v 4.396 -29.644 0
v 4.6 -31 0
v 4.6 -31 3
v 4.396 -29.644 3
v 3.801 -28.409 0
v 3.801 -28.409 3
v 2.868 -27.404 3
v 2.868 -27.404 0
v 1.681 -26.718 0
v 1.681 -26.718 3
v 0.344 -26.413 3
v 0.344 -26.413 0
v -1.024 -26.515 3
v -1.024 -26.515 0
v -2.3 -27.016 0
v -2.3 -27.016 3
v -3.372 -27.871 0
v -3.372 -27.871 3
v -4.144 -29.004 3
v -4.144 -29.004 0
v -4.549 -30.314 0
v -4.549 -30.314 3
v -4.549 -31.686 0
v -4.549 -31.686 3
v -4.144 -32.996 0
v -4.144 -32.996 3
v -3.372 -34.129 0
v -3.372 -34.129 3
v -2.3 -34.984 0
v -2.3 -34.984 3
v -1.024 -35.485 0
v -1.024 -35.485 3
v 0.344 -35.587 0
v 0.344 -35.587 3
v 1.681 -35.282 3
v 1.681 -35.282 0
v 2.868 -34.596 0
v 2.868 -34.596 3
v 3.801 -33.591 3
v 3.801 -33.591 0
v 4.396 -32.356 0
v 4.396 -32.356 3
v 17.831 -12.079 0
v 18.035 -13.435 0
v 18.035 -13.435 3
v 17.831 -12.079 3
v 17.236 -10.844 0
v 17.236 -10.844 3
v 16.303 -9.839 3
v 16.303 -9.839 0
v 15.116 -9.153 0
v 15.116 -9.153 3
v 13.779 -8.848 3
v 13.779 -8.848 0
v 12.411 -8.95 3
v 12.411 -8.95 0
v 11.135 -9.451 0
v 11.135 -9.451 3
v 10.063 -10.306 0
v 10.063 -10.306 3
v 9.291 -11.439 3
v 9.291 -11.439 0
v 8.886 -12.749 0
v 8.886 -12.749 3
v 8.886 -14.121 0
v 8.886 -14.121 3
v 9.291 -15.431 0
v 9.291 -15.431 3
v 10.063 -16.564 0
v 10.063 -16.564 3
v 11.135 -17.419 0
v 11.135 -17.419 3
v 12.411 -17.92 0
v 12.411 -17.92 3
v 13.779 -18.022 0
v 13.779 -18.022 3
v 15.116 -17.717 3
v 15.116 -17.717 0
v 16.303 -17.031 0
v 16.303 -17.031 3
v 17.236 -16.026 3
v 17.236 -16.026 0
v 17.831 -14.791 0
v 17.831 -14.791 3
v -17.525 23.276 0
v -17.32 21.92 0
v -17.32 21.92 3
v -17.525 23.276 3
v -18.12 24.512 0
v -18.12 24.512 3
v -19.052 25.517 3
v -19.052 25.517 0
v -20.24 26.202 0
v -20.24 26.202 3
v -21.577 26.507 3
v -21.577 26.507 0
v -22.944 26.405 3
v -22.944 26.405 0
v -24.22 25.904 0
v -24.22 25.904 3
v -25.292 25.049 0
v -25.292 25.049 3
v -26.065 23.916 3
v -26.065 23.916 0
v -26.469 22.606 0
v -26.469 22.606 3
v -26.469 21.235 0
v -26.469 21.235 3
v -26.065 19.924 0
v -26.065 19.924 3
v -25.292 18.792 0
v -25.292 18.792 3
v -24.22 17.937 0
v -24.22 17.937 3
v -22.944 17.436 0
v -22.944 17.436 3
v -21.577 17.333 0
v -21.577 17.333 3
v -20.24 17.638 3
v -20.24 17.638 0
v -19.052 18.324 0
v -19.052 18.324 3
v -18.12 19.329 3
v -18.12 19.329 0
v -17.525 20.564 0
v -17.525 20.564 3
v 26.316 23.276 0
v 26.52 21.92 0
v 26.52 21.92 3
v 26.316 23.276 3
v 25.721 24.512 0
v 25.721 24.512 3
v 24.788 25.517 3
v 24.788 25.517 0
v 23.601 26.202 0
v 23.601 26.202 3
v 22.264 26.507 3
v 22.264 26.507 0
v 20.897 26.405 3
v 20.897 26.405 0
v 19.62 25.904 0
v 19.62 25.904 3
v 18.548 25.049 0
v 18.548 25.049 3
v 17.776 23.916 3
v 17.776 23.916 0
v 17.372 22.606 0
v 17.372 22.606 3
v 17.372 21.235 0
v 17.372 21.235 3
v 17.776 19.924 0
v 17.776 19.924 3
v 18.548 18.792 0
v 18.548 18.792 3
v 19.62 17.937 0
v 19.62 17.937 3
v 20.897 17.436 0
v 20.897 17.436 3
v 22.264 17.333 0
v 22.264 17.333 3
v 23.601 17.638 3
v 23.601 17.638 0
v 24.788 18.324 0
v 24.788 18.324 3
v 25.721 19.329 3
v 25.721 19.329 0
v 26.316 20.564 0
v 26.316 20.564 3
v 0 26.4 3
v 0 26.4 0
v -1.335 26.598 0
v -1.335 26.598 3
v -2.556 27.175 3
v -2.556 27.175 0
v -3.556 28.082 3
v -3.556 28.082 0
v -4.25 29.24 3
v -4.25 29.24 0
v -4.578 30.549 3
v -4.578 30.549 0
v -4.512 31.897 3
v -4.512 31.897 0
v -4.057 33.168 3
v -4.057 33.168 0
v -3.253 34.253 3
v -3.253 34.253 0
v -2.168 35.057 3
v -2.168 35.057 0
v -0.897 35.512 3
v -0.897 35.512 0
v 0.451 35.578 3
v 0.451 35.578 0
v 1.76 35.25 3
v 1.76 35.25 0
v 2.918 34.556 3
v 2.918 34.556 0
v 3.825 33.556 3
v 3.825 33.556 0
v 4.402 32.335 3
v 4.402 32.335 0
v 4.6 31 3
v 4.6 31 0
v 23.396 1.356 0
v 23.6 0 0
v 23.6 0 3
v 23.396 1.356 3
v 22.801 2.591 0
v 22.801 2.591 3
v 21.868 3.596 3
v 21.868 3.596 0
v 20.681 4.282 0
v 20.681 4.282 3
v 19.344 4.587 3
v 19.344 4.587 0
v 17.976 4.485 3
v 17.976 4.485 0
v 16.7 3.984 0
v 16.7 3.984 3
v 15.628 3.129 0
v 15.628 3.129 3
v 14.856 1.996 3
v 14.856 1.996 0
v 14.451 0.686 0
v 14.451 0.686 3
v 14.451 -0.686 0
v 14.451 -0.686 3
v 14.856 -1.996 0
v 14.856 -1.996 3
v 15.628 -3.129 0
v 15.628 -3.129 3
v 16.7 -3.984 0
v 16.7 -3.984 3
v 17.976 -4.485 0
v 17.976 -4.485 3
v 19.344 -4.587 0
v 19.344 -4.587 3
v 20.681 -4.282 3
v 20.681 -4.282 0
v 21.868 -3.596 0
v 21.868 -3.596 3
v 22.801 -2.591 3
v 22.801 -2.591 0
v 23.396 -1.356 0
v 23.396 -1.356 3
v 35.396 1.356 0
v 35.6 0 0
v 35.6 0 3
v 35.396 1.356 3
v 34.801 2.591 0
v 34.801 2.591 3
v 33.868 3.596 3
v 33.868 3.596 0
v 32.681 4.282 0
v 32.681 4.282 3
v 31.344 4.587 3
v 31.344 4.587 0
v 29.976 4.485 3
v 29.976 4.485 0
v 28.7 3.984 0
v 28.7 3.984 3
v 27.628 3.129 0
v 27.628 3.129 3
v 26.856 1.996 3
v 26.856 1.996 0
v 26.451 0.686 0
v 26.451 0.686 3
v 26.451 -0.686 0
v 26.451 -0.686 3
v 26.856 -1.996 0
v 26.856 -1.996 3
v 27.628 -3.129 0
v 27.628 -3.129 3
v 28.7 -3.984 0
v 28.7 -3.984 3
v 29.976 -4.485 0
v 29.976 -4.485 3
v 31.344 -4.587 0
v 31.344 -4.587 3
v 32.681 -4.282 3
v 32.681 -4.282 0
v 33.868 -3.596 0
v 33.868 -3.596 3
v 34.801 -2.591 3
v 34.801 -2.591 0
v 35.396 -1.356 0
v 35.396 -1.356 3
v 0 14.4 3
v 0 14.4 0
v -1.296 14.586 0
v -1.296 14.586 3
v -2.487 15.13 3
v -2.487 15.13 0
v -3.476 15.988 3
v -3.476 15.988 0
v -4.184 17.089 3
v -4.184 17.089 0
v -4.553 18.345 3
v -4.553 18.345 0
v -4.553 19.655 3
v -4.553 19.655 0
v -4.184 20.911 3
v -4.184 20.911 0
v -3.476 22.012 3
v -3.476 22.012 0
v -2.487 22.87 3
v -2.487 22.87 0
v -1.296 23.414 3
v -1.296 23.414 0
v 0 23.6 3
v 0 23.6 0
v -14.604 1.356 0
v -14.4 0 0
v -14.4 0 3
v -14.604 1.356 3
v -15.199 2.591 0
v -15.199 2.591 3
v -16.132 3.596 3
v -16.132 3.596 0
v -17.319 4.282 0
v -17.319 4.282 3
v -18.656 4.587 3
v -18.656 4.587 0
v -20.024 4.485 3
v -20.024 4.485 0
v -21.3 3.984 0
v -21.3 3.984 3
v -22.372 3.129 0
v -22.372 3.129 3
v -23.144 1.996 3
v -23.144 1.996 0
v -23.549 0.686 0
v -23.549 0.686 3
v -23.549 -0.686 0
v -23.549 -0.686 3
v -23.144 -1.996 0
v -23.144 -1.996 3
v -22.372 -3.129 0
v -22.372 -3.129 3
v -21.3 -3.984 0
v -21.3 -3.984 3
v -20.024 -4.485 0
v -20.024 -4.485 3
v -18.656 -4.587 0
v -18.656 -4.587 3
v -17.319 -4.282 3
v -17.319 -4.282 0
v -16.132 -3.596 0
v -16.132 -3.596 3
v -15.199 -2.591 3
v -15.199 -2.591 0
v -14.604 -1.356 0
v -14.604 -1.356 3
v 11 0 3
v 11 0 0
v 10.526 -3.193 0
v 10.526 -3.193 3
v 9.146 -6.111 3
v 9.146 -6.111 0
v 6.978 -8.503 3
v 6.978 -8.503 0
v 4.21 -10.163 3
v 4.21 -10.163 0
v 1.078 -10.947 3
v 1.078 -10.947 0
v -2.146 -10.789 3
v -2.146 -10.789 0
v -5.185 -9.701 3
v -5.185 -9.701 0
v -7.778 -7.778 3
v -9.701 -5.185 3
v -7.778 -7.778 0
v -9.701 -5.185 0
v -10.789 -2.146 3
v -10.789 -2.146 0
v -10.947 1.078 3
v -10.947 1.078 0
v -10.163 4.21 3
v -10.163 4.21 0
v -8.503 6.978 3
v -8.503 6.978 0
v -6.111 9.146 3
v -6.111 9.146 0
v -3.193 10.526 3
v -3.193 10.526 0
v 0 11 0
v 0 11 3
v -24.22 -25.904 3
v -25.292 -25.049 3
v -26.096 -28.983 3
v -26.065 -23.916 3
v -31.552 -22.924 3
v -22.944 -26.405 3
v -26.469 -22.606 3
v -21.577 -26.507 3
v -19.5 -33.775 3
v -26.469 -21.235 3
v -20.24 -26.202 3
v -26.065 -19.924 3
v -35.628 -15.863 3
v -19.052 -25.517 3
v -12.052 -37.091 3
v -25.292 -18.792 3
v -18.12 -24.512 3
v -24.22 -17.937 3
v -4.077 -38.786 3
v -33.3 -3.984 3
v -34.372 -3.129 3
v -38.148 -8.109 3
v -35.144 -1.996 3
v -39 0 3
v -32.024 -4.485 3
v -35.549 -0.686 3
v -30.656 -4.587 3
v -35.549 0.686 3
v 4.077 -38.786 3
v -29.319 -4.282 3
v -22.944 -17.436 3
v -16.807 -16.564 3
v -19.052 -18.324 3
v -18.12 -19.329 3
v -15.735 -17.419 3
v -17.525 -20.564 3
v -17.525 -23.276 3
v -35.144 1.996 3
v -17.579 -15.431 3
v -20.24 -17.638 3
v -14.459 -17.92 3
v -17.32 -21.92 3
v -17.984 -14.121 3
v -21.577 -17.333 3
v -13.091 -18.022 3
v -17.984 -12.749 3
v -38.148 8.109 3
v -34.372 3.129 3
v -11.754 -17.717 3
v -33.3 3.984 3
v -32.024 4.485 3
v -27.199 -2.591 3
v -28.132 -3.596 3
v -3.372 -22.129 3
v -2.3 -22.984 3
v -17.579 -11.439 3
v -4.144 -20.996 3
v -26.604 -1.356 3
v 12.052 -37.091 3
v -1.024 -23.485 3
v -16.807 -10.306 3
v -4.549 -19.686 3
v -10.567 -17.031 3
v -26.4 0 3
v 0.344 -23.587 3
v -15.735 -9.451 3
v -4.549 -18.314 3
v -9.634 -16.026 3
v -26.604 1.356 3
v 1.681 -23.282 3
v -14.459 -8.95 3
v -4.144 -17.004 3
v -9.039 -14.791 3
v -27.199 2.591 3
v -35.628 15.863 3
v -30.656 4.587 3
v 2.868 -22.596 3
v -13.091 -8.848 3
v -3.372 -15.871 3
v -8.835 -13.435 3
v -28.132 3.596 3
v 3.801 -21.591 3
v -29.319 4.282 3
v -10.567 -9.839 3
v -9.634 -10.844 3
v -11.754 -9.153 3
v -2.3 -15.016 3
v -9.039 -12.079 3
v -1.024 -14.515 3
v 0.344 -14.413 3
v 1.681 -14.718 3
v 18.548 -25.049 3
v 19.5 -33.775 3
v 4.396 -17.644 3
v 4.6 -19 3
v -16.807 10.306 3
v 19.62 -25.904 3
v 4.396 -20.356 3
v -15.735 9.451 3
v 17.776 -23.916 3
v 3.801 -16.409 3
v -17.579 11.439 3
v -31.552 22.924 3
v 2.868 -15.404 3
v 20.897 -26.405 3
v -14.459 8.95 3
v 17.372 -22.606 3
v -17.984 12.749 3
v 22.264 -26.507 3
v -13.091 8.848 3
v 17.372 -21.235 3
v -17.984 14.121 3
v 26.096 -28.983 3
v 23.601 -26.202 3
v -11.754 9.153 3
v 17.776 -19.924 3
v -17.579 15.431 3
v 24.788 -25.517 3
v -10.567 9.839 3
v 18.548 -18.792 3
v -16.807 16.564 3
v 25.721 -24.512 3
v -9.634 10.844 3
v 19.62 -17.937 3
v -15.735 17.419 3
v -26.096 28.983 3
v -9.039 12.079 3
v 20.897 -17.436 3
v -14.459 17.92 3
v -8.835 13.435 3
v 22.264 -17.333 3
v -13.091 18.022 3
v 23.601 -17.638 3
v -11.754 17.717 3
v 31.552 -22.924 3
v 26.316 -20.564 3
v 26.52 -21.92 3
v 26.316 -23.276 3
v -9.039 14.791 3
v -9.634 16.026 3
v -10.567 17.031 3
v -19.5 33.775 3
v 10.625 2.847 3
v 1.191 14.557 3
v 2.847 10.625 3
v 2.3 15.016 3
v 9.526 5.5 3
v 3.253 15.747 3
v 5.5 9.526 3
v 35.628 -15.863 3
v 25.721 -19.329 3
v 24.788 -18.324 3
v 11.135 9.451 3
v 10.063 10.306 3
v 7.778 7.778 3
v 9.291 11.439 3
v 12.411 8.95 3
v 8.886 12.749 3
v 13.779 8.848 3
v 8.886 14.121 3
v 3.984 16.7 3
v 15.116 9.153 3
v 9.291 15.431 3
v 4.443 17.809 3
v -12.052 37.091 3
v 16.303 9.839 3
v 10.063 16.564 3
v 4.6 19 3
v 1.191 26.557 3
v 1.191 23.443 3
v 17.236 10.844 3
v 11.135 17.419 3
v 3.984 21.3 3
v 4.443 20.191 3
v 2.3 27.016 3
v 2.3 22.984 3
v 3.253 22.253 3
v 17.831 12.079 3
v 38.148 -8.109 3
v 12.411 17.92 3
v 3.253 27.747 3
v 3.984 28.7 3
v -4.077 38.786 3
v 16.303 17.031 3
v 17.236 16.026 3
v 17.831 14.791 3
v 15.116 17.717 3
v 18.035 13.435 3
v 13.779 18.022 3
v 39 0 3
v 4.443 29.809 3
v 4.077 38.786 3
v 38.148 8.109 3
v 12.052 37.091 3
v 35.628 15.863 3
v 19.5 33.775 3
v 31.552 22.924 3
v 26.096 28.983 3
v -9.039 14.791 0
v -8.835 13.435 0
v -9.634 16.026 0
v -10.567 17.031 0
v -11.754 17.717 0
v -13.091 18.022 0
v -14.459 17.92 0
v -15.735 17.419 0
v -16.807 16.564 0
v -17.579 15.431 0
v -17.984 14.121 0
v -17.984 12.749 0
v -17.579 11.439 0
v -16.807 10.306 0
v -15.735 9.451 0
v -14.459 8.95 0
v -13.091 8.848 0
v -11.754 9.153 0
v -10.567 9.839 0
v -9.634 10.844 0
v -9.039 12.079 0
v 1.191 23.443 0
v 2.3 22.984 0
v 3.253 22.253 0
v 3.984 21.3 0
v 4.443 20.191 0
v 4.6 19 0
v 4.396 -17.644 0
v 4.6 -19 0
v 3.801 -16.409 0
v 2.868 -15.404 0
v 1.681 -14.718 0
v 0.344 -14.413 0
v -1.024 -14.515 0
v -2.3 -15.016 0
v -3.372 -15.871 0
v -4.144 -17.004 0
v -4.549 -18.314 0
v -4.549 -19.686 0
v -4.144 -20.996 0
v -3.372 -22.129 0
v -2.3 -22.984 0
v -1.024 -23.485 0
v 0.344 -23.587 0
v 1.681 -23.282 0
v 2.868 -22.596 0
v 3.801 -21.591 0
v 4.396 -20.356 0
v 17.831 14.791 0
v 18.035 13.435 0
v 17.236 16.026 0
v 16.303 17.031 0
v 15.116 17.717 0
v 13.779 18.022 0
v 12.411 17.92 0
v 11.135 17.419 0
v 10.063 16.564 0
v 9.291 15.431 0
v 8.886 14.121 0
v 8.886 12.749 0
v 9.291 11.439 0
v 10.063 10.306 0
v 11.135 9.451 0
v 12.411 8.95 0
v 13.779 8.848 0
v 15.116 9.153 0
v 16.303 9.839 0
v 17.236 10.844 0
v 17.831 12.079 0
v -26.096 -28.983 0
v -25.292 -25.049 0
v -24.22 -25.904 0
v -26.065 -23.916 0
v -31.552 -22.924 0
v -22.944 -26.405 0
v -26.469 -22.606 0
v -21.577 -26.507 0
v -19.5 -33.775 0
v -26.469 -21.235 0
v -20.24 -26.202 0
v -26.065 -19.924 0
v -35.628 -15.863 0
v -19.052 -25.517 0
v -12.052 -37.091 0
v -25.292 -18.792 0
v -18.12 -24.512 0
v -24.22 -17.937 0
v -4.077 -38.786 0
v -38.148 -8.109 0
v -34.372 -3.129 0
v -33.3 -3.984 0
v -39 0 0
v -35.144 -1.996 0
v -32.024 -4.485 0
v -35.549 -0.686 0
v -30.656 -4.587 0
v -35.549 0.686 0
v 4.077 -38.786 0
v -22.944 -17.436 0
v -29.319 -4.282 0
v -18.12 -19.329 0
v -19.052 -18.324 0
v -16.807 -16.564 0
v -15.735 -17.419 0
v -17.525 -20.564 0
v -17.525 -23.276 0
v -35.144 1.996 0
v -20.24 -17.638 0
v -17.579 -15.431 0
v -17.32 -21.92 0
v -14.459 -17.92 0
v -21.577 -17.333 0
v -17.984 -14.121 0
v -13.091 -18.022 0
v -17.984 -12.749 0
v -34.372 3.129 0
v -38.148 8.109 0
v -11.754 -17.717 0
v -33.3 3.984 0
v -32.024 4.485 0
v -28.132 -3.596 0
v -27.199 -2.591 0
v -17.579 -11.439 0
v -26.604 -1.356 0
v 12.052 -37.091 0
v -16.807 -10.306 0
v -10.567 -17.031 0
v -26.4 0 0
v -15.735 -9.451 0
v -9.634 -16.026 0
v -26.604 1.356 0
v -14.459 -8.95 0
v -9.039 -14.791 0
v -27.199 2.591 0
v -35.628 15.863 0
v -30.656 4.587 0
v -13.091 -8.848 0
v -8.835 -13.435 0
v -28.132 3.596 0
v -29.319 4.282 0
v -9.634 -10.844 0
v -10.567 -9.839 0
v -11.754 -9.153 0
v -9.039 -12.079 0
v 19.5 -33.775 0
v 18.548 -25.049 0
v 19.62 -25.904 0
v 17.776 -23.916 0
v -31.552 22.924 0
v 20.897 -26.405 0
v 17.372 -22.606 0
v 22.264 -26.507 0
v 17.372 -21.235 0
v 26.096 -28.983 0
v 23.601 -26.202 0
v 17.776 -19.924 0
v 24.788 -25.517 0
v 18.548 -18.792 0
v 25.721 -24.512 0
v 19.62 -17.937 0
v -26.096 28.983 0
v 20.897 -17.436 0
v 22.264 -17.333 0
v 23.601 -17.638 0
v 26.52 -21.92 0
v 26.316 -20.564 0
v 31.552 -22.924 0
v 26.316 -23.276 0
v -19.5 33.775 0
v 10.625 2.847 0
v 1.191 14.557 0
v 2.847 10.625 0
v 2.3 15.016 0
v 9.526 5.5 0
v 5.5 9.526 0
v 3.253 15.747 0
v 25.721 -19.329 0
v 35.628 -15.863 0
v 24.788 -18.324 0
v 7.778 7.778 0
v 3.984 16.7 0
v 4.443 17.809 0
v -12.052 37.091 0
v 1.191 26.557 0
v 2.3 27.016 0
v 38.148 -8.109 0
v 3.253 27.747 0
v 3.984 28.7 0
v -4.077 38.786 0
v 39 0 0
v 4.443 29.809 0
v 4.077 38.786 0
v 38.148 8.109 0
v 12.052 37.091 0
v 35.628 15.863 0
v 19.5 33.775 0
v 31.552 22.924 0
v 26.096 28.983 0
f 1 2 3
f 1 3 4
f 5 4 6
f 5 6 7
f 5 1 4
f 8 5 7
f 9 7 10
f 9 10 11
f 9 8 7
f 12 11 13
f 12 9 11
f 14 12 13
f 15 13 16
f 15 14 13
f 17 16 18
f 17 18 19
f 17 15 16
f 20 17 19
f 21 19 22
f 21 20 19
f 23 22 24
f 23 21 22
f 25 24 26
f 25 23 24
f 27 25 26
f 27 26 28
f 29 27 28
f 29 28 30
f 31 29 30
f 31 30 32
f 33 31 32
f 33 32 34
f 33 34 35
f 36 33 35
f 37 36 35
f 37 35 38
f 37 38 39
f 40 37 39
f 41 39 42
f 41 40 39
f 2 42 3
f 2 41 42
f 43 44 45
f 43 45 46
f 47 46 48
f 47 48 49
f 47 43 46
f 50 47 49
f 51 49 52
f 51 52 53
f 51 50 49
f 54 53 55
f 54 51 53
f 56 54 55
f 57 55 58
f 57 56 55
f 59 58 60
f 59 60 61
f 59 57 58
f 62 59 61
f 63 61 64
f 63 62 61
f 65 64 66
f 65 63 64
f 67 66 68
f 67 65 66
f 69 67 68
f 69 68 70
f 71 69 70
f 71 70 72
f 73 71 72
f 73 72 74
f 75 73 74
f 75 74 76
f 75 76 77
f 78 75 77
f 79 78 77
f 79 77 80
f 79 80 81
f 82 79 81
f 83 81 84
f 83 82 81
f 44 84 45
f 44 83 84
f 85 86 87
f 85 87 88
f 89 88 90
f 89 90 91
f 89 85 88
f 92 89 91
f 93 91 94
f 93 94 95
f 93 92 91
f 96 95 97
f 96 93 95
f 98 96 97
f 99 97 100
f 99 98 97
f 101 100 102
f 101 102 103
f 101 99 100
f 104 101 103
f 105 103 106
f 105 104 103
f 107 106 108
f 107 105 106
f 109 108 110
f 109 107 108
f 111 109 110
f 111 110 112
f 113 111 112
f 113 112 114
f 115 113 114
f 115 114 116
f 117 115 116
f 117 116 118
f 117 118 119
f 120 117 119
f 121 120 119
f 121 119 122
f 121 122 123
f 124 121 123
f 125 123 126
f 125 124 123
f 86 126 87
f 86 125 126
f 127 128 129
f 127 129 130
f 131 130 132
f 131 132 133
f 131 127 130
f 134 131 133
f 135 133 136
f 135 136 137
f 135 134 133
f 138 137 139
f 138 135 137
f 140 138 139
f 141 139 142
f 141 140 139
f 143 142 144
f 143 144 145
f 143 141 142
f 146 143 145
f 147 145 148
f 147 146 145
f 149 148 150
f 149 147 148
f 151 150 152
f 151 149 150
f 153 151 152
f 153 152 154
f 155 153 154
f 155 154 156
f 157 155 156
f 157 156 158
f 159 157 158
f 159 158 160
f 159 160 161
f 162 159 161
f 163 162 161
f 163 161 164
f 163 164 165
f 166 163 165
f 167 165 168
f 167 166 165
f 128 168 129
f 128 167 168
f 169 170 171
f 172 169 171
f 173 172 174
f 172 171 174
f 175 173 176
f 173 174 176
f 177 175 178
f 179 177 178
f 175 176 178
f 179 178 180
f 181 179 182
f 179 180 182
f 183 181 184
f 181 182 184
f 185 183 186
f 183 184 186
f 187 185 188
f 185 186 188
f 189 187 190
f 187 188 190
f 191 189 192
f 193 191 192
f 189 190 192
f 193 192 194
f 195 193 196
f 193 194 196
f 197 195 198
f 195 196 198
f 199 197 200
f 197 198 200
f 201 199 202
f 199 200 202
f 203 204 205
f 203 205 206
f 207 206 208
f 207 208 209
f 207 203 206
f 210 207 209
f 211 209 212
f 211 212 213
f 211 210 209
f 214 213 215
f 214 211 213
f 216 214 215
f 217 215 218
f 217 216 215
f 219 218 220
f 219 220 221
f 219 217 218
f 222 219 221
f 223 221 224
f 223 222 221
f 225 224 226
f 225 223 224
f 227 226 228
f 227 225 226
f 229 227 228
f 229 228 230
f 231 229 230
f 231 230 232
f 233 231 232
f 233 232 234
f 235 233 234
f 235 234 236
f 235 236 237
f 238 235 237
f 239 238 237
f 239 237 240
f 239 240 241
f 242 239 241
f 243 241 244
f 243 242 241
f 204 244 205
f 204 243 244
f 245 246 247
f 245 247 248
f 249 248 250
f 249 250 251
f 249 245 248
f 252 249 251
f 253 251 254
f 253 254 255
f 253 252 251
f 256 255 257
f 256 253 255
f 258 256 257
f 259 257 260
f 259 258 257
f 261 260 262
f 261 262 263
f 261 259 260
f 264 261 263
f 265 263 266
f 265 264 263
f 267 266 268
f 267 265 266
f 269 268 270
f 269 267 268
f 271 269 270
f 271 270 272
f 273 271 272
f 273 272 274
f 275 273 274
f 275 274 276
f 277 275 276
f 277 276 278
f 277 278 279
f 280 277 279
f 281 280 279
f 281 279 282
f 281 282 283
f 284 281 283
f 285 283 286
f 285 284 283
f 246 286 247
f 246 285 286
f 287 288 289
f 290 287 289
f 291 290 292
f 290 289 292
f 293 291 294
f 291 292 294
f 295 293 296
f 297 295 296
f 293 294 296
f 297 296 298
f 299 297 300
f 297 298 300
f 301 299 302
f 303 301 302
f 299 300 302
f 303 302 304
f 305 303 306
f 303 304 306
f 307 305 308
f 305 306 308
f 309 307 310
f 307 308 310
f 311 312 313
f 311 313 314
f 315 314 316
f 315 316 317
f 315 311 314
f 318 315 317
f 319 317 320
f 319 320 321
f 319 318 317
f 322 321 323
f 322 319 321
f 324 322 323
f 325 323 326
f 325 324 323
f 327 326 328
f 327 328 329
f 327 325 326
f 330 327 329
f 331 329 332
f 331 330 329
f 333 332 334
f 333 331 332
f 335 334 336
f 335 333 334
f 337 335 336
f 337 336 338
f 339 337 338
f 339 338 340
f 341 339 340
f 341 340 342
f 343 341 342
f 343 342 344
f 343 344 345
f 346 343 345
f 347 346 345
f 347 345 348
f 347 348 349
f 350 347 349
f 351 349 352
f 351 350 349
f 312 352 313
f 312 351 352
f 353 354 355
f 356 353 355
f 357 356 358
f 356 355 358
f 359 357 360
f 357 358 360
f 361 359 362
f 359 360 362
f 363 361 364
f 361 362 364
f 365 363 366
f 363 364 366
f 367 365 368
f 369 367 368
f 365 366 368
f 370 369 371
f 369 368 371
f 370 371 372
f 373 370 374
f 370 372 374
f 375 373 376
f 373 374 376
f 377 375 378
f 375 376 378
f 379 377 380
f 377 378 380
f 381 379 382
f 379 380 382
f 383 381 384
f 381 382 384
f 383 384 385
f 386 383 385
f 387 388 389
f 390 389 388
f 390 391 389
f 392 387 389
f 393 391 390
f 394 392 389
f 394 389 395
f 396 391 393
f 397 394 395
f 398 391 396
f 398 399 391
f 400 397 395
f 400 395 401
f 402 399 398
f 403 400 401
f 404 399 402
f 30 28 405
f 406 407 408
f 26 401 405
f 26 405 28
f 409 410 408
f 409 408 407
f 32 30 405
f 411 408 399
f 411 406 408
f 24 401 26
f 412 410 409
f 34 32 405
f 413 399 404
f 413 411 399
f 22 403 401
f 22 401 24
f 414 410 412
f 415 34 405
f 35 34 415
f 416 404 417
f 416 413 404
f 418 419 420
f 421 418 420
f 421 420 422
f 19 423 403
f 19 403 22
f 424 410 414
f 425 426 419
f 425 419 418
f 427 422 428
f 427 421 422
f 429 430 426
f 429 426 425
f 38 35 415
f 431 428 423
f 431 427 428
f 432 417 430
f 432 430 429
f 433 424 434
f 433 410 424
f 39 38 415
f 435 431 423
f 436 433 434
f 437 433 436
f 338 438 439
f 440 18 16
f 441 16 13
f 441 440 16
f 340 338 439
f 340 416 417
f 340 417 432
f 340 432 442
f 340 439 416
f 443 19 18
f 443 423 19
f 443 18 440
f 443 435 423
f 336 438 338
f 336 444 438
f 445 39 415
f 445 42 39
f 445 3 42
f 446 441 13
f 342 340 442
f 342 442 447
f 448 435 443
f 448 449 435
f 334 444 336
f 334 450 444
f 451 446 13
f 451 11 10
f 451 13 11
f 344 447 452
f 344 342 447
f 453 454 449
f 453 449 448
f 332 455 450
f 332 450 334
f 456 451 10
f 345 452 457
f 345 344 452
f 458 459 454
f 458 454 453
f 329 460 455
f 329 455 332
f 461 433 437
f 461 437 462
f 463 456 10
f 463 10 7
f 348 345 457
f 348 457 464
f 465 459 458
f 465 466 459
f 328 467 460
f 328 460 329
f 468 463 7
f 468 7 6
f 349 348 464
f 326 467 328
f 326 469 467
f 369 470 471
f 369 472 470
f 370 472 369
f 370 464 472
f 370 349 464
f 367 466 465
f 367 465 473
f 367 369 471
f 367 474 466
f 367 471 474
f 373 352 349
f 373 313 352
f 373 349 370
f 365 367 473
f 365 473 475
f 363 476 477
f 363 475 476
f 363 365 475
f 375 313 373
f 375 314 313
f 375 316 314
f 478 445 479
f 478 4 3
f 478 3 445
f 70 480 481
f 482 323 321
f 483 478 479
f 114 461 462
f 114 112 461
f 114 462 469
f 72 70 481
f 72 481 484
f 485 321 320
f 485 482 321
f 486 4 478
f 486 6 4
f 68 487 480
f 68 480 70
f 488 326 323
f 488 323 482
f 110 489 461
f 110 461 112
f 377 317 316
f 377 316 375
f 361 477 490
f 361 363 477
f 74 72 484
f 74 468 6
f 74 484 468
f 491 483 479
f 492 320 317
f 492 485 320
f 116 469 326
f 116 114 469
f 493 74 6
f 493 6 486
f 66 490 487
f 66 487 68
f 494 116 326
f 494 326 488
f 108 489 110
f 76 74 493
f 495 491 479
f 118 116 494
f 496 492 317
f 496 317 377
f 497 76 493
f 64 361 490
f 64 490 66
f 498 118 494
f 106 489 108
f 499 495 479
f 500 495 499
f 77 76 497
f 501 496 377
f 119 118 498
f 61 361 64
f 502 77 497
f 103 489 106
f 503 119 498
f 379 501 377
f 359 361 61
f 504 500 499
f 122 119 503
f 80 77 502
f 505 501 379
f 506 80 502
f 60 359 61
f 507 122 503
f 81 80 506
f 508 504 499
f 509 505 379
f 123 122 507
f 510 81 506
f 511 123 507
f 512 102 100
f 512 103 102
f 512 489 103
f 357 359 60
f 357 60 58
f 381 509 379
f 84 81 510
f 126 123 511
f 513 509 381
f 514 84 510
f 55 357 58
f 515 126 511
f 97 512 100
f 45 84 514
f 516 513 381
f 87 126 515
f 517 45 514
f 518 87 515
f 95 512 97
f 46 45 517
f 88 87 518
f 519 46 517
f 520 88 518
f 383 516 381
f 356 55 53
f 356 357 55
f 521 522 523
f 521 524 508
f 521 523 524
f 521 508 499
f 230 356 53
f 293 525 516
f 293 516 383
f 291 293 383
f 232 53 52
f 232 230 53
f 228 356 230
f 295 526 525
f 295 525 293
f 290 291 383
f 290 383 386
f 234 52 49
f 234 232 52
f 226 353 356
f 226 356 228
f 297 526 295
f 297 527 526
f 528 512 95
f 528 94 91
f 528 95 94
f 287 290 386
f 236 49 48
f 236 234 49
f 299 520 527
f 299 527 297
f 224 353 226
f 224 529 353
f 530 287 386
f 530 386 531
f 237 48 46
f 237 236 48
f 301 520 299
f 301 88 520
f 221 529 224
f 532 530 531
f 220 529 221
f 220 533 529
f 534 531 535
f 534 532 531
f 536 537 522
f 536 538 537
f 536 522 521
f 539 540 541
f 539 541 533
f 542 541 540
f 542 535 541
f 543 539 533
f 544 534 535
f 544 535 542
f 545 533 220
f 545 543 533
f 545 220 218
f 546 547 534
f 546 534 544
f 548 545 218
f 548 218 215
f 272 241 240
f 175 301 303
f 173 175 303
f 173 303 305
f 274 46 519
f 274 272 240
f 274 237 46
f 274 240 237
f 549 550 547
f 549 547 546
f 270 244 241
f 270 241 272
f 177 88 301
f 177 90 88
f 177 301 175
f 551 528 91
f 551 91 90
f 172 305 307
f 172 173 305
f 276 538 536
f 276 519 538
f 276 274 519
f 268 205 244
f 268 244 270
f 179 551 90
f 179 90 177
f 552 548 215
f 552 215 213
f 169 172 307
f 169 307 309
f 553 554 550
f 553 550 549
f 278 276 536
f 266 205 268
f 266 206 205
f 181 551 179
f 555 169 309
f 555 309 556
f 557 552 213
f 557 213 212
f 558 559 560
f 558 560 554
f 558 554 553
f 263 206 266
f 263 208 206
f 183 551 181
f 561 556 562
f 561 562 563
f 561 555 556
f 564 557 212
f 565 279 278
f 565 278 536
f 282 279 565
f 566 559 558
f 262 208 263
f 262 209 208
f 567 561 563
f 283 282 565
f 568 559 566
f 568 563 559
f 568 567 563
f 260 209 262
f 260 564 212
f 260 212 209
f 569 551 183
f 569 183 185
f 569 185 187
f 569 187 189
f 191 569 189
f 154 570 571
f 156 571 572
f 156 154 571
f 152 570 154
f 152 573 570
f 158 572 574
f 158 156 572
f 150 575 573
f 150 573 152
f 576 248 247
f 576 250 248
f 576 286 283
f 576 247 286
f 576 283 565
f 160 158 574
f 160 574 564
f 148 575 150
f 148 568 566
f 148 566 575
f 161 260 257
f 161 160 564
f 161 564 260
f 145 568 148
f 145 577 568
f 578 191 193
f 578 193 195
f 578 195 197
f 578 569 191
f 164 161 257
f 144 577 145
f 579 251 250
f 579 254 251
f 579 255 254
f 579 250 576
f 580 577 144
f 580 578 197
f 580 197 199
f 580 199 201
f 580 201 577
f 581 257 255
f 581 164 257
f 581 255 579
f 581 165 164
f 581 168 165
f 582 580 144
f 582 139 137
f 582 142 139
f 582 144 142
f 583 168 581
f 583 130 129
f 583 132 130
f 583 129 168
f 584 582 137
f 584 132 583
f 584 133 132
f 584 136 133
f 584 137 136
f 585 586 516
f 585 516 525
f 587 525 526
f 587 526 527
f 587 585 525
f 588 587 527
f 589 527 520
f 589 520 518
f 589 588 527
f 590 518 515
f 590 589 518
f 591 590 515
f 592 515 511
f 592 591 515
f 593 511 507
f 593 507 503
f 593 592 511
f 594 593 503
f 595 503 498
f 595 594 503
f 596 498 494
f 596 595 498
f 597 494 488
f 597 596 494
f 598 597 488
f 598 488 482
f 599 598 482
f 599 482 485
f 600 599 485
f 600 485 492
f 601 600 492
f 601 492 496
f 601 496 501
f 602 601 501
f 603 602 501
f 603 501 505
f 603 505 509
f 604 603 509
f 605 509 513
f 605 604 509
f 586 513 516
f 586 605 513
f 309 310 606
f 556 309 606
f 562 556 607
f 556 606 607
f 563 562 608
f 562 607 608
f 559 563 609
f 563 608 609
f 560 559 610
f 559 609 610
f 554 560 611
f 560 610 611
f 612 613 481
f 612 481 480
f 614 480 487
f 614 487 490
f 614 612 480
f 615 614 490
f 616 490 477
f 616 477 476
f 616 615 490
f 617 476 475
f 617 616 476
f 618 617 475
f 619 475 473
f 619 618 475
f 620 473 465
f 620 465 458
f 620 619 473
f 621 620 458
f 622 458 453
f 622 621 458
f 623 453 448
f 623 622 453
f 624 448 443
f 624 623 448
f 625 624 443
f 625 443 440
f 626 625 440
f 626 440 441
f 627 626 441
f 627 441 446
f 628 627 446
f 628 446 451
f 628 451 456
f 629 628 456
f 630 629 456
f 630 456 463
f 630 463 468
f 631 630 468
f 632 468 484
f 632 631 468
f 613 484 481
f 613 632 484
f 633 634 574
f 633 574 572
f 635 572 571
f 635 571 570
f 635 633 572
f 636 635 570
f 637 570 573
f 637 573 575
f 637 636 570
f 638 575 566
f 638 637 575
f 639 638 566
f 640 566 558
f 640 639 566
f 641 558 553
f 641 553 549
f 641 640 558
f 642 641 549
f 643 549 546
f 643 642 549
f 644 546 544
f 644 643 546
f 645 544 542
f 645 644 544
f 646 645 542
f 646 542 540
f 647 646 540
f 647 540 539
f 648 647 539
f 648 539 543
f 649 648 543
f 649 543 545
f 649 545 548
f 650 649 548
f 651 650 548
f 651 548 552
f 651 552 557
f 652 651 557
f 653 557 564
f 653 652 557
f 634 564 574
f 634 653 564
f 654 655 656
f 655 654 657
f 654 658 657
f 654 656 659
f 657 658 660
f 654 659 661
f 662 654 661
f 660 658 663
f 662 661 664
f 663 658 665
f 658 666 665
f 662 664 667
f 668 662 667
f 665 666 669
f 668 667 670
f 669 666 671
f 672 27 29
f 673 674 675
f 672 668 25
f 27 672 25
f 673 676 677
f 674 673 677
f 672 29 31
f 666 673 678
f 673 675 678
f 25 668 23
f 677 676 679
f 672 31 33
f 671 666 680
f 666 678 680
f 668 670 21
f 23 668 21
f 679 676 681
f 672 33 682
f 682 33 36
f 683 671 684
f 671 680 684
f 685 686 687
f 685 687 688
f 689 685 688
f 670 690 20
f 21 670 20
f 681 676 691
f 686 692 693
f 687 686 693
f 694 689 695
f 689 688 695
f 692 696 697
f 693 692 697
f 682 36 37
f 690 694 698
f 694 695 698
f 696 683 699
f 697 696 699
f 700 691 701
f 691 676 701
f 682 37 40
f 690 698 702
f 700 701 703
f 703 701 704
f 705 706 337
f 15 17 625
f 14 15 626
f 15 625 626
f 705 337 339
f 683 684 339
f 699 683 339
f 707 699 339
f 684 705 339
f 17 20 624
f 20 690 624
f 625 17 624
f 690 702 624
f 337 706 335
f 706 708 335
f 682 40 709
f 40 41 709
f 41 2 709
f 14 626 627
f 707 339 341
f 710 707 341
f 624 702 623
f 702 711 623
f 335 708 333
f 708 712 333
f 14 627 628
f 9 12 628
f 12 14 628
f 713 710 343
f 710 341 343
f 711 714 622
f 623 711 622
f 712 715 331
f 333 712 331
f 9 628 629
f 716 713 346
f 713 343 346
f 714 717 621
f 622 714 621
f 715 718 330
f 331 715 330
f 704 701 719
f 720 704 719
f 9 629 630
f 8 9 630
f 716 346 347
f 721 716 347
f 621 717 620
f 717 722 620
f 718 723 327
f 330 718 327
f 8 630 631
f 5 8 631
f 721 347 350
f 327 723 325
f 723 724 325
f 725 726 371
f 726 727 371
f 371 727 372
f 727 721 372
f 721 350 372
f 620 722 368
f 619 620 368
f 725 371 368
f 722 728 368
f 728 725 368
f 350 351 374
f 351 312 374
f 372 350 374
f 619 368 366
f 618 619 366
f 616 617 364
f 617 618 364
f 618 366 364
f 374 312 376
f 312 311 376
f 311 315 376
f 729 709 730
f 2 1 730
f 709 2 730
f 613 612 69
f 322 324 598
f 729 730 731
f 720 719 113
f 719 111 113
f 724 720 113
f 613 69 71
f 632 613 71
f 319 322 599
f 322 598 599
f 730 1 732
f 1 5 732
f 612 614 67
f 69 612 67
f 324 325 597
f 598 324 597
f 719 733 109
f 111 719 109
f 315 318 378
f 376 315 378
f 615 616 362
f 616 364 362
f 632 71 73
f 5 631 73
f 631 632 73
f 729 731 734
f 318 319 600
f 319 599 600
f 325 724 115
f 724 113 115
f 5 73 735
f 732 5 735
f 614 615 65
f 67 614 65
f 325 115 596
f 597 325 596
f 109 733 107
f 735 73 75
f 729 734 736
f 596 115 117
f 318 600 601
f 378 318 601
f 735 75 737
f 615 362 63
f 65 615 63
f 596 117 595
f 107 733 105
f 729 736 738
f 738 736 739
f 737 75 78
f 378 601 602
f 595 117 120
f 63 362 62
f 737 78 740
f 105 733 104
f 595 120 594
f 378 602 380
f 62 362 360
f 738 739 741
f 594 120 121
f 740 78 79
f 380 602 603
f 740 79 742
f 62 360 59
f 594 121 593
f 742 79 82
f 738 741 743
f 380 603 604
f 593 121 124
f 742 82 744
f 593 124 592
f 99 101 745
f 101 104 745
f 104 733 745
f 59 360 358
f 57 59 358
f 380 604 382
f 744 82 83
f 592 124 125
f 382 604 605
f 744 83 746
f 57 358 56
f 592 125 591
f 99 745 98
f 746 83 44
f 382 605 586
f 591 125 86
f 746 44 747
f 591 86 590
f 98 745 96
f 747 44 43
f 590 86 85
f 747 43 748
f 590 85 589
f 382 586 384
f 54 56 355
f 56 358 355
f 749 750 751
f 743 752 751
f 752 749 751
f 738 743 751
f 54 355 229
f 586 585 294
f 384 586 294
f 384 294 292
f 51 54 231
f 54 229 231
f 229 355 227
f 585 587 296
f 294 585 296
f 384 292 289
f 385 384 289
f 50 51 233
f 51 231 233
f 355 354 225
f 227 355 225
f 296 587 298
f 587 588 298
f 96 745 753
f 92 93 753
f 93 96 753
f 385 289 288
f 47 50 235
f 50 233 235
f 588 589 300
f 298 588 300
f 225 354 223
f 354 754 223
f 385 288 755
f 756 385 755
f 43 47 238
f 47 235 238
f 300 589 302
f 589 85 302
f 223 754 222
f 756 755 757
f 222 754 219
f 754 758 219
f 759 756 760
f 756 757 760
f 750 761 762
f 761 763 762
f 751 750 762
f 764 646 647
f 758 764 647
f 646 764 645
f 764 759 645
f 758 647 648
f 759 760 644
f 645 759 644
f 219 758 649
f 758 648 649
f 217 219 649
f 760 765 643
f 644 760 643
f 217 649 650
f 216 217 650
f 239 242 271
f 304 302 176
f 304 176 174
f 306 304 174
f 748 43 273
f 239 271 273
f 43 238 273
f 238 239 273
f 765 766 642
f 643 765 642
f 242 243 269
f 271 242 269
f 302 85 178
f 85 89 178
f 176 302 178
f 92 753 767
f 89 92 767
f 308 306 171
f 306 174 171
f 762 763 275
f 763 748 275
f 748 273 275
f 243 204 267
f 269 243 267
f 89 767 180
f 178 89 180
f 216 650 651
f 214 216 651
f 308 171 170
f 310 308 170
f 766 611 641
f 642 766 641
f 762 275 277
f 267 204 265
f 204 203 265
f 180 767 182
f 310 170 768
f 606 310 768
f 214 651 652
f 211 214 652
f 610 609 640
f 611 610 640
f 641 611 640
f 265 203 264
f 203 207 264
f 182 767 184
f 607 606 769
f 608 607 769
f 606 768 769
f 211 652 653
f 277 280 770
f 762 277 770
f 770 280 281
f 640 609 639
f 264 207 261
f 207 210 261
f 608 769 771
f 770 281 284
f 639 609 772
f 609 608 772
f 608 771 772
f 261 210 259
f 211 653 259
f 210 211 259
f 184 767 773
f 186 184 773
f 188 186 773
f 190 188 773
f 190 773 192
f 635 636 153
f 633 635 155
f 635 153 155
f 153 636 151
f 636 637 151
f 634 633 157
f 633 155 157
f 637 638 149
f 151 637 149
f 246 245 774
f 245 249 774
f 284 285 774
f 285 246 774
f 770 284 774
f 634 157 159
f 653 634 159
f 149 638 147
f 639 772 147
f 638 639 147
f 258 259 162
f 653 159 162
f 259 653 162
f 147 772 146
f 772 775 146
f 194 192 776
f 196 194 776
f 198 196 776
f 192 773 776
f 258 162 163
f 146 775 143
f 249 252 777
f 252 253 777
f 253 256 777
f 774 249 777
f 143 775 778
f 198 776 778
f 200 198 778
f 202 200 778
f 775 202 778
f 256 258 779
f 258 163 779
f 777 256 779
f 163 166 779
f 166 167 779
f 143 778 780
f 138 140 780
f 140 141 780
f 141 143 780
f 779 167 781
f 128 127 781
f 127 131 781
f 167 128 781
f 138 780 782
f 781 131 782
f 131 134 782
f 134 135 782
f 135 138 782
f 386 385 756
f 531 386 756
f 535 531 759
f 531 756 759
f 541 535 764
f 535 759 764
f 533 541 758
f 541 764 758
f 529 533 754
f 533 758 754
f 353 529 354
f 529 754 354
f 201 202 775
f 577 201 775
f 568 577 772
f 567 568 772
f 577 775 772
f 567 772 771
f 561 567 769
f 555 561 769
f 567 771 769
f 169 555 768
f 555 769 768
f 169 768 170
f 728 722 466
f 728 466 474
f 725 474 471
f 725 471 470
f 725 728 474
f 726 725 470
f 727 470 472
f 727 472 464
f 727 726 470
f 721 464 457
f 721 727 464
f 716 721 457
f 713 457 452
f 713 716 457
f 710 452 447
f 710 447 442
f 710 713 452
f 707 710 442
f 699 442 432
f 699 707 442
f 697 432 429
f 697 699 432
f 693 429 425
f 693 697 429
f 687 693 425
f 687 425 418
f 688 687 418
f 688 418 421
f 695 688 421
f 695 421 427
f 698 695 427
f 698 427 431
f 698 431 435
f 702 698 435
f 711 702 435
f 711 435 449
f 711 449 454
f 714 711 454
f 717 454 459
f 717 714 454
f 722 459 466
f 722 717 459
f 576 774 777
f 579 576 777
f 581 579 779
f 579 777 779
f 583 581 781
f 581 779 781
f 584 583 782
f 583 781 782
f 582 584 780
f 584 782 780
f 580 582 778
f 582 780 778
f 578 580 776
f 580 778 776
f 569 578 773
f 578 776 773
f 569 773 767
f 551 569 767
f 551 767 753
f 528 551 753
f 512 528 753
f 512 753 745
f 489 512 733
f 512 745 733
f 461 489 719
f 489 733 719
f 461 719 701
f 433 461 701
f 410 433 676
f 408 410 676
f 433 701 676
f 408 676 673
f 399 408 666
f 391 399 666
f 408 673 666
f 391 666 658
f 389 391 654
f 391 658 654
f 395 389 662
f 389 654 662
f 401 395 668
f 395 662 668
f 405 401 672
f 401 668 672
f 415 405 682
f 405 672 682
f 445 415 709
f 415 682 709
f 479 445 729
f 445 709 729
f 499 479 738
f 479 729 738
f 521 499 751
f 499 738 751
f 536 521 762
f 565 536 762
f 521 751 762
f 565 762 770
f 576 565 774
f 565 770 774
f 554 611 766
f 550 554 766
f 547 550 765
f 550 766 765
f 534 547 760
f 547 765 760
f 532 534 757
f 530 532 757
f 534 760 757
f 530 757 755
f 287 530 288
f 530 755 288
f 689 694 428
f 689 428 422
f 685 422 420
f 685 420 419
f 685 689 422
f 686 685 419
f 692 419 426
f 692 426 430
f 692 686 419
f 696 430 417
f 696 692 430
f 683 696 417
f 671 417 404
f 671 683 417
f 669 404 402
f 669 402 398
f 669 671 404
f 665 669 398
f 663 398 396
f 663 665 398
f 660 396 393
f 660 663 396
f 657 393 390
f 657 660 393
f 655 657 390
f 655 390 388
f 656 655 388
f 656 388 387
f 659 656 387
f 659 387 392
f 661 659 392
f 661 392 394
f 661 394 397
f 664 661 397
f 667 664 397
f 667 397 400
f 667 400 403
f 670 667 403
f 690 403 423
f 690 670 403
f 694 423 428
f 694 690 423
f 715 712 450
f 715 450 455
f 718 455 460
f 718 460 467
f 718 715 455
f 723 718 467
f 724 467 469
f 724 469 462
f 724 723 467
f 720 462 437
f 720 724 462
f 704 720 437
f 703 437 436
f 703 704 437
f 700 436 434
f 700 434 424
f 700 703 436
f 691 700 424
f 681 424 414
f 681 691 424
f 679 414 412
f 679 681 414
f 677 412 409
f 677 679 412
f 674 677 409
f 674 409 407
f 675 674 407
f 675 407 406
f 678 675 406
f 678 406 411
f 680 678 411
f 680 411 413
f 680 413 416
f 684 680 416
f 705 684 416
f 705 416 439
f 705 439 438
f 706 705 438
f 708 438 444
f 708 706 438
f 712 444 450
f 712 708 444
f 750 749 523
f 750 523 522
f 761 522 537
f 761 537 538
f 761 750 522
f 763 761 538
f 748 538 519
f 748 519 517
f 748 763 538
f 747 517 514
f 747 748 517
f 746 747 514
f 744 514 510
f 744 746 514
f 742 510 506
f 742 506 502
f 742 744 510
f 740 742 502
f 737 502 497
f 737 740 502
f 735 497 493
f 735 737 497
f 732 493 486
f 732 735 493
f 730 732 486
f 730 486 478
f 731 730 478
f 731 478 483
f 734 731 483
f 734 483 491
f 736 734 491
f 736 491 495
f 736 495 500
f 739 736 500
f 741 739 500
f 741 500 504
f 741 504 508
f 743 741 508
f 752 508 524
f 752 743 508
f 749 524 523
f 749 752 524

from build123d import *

# Parameters (mm, degrees)
F0_R     = 39
F0_R_2   = 4.6
F1_DEPTH = 3


with BuildPart() as f1:
    # F0 (on Top) → F1 (new body)
    with BuildSketch(Plane.XY):
        with BuildLine():
            ThreePointArc((0, 11), (-7.778175, -7.778175), (11, 0))
            ThreePointArc((11, 0), (7.778175, 7.778175), (0, 11))
        make_face()
        with BuildLine():
            ThreePointArc((4.6, 31), (-3.252691, 34.252691), (0, 26.4))
            ThreePointArc((0, 26.4), (3.252691, 27.747309), (4.6, 31))
        make_face()
        Circle(F0_R)
        with Locations((-21.92031, -21.92031)):
            Circle(F0_R_2, mode=Mode.SUBTRACT)
        with Locations((-13.435029, -13.435029)):
            Circle(F0_R_2, mode=Mode.SUBTRACT)
        with Locations((0, -31)):
            Circle(F0_R_2, mode=Mode.SUBTRACT)
        with Locations((21.92031, -21.92031)):
            Circle(F0_R_2, mode=Mode.SUBTRACT)
        with Locations((0, -19)):
            Circle(F0_R_2, mode=Mode.SUBTRACT)
        with Locations((13.435029, -13.435029)):
            Circle(F0_R_2, mode=Mode.SUBTRACT)
        with Locations((-31, 0)):
            Circle(F0_R_2, mode=Mode.SUBTRACT)
        with Locations((-19, 0)):
            Circle(F0_R_2, mode=Mode.SUBTRACT)
        with Locations((-13.435029, 13.435029)):
            Circle(F0_R_2, mode=Mode.SUBTRACT)
        with Locations((-21.92031, 21.92031)):
            Circle(F0_R_2, mode=Mode.SUBTRACT)
        with BuildLine():
            ThreePointArc((0, 11), (7.778175, 7.778175), (11, 0))
            ThreePointArc((11, 0), (-7.778175, -7.778175), (0, 11))
        make_face(mode=Mode.SUBTRACT)
        with Locations((19, 0)):
            Circle(F0_R_2, mode=Mode.SUBTRACT)
        with BuildLine():
            ThreePointArc((4.6, 19), (3.252691, 15.747309), (0, 14.4))
            ThreePointArc((0, 14.4), (-4.6, 19), (0, 23.6))
            ThreePointArc((0, 23.6), (3.252691, 22.252691), (4.6, 19))
        make_face(mode=Mode.SUBTRACT)
        with Locations((13.435029, 13.435029)):
            Circle(F0_R_2, mode=Mode.SUBTRACT)
        with Locations((31, 0)):
            Circle(F0_R_2, mode=Mode.SUBTRACT)
        with BuildLine():
            ThreePointArc((4.6, 31), (3.252691, 27.747309), (0, 26.4))
            ThreePointArc((0, 26.4), (-3.252691, 34.252691), (4.6, 31))
        make_face(mode=Mode.SUBTRACT)
        with Locations((21.92031, 21.92031)):
            Circle(F0_R_2, mode=Mode.SUBTRACT)
    extrude(amount=F1_DEPTH)


solid = f1.part
